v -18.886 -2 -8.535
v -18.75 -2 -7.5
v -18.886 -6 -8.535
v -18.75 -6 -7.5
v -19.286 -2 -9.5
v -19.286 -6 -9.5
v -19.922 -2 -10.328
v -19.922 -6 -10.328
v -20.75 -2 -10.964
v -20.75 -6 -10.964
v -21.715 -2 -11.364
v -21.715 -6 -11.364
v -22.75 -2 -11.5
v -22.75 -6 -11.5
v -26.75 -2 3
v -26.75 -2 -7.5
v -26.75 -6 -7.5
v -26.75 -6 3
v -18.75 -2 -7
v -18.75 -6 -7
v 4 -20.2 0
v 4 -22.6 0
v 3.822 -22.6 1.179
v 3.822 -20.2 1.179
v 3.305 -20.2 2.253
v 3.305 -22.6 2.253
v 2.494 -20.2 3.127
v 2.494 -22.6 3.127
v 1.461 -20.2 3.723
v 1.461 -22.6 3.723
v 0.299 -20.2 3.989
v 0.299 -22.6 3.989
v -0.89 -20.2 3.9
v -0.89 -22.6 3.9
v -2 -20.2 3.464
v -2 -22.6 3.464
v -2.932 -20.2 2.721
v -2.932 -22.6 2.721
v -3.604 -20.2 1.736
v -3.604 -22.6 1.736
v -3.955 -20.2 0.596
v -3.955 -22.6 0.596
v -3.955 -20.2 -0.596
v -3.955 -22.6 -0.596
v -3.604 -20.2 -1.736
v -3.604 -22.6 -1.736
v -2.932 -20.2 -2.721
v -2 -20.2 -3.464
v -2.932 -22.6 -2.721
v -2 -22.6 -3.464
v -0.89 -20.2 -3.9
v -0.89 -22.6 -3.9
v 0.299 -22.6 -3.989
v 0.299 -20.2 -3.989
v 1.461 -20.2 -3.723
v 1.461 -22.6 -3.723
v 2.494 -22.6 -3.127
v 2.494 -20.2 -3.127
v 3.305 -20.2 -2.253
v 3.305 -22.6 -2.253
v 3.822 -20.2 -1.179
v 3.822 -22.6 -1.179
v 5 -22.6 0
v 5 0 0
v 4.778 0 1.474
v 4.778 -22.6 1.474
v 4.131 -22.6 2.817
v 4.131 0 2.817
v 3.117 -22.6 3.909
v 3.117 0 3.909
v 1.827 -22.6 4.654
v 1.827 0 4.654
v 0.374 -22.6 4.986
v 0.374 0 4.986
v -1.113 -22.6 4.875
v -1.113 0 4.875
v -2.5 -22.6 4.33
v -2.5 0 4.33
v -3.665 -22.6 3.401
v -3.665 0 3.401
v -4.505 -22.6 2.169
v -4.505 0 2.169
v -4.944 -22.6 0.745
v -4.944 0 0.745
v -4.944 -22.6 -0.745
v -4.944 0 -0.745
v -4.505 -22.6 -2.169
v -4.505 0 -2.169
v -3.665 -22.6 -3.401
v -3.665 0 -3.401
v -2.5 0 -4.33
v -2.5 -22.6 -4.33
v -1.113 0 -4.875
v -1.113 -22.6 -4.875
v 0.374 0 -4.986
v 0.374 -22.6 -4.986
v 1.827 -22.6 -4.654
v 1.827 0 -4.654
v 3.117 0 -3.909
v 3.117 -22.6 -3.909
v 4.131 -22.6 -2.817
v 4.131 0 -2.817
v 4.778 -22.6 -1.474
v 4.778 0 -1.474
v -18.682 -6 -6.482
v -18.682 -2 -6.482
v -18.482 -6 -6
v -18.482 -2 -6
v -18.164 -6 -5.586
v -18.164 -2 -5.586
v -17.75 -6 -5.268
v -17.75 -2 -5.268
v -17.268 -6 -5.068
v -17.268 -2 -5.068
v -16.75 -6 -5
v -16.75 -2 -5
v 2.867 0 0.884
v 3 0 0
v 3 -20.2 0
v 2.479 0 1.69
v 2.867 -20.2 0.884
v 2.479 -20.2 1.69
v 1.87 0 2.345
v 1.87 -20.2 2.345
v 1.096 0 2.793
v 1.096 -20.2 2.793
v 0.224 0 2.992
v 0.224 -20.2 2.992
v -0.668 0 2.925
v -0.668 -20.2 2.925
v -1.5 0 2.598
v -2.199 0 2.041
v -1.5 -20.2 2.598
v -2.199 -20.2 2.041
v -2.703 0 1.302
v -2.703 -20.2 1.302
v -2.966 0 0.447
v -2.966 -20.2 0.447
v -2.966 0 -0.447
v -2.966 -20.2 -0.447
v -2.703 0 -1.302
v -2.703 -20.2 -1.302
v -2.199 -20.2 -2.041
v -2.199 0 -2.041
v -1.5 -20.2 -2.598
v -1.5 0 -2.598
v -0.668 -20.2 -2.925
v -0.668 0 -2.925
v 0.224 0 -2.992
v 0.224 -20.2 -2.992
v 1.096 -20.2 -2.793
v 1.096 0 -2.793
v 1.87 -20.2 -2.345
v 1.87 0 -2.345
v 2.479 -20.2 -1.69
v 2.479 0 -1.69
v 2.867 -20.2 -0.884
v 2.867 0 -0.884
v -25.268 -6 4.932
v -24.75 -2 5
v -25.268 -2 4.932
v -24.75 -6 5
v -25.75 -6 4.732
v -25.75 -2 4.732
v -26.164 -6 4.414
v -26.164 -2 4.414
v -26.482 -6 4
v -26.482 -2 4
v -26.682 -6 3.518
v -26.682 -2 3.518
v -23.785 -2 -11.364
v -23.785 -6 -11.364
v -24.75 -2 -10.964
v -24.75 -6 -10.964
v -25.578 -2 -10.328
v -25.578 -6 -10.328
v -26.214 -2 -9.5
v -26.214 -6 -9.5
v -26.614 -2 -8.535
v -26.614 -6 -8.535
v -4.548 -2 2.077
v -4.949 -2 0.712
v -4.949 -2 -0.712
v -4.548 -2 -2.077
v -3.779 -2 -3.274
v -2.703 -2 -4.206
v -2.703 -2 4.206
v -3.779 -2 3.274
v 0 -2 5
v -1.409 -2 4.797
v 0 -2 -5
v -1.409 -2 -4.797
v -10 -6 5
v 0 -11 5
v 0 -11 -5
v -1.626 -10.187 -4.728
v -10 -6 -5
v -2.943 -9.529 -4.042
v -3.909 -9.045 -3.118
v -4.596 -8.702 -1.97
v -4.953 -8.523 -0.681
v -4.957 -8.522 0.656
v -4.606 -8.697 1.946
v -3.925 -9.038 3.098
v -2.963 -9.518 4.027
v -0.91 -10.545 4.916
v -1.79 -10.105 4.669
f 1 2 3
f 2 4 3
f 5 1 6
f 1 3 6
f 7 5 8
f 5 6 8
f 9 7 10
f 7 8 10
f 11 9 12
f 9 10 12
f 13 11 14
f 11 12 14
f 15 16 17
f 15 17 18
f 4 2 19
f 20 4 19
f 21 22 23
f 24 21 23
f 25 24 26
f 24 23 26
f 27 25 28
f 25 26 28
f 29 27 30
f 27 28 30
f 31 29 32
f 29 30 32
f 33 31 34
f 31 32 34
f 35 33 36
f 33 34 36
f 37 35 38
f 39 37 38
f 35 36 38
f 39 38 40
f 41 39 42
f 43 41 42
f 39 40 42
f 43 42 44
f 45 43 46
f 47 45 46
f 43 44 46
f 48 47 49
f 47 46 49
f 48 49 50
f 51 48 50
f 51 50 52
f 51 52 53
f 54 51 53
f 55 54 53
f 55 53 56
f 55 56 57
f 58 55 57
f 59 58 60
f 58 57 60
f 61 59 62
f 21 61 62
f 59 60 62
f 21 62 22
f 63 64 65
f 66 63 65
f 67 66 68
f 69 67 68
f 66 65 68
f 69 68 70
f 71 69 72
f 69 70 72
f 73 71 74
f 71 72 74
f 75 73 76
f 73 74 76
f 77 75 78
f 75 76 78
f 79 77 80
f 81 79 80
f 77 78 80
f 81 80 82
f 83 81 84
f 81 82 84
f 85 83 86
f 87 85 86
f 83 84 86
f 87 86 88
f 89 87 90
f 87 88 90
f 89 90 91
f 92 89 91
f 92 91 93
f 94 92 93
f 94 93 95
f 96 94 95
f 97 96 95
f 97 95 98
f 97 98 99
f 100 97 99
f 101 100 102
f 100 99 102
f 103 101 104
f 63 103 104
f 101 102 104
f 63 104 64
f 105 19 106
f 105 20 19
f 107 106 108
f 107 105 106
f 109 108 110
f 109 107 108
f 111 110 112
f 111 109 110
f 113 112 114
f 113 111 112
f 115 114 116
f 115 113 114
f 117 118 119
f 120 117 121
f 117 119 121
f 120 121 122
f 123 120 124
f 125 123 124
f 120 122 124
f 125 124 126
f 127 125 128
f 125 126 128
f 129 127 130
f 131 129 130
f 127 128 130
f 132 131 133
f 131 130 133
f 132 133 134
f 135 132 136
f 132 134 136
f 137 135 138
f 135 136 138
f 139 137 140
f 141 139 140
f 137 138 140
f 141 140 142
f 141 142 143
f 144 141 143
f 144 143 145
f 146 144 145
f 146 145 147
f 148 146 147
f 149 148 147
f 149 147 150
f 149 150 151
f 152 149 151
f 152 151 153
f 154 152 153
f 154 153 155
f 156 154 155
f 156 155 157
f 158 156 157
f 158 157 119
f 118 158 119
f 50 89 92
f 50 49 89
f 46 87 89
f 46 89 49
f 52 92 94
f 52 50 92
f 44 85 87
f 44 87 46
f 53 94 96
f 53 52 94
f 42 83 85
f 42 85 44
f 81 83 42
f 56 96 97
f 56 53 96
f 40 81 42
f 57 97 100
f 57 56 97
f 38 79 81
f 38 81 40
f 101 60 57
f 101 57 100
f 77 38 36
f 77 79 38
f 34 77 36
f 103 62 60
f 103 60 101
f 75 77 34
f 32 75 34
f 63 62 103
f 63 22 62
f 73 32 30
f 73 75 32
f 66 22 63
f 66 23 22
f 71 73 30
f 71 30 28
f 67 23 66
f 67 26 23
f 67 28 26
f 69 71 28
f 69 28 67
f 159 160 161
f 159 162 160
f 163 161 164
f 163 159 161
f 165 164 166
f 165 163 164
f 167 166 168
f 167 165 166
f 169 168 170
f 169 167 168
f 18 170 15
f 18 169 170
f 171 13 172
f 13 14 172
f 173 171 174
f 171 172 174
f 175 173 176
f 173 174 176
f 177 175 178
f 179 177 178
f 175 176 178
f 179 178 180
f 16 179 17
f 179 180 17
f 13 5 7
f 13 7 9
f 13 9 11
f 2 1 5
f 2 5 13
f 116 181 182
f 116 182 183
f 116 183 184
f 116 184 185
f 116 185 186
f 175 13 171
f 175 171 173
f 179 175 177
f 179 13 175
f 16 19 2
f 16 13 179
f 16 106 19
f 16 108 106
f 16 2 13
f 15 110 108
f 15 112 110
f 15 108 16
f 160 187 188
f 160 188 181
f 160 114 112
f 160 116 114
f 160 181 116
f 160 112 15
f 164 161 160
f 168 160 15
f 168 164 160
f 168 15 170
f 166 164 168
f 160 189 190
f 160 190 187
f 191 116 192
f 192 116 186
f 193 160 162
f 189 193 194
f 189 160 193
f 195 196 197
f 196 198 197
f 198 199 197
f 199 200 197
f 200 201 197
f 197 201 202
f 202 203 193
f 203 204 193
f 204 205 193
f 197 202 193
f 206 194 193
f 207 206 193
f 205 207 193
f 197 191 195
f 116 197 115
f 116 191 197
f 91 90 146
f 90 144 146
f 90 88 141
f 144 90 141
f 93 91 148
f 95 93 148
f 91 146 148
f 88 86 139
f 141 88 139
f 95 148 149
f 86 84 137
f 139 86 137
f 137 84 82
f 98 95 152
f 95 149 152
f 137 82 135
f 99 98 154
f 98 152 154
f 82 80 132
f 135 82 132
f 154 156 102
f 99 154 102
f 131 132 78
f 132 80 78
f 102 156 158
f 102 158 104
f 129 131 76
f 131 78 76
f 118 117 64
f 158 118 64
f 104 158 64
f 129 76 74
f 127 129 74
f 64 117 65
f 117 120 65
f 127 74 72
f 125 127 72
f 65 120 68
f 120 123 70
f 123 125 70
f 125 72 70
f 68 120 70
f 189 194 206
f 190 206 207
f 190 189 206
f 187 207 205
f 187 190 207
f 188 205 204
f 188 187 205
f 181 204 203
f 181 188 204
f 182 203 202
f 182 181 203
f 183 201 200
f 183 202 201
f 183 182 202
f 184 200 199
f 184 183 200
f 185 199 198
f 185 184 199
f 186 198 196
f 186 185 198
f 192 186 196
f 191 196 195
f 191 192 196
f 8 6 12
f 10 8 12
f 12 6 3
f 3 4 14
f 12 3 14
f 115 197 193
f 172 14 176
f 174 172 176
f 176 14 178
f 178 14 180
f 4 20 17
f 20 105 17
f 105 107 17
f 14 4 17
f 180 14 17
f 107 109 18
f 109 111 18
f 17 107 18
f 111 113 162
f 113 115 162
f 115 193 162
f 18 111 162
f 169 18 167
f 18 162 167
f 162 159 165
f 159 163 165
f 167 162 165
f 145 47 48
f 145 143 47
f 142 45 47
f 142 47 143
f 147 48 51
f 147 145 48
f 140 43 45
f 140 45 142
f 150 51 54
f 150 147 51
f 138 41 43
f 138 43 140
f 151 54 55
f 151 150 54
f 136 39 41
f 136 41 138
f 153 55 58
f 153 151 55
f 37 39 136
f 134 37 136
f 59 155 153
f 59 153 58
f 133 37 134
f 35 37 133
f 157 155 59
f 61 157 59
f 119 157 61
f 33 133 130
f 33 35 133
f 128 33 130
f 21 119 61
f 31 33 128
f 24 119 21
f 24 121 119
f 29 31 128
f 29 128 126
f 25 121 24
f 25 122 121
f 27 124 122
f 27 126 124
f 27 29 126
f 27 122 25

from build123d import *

# Parameters (mm, degrees)
F0_R      = 5
F1_DEPTH  = 22.6
F2_R      = 3
F3_DEPTH  = 25
F4_R      = 4
F4_R_2    = 3
F5_DEPTH  = 2.4
F7_W      = 8
F7_H      = 10
F7_H_2    = 6.5
F8_DEPTH  = 9
F10_DEPTH = 25
F11_R     = 2
F12_R     = 2
F13_R     = 3.99999


# Not quite as in the source:
# - a fillet or chamfer is up to 0.001 mm smaller than in the source, because OpenCascade refuses the exact size


with BuildPart() as f1:
    # F0 (on Front) → F1 (new body)
    with BuildSketch(Plane.XZ):
        Circle(F0_R)
    extrude(amount=F1_DEPTH)

    # F2 (on face) → F3 (cut)
    with BuildSketch(Plane.XZ.offset(22.6)):
        Circle(F2_R)
    extrude(amount=-F3_DEPTH, mode=Mode.SUBTRACT)

    # F4 (on face) → F5 (cut)
    with BuildSketch(Plane.XZ.offset(22.6)):
        Circle(F4_R)
        Circle(F4_R_2, mode=Mode.SUBTRACT)
    extrude(amount=-F5_DEPTH, mode=Mode.SUBTRACT)


with BuildPart() as f8:
    # F7 (on offset) → F8 (new body)
    with BuildSketch(Plane(origin=(0, -2, 0), x_dir=(-1, 0, 0), z_dir=(0, 1, 0))):
        with BuildLine():
            ThreePointArc((0, 5), (5, 0), (0, -5))
            Line((0, -5), (18.75, -5))
            Line((18.75, -5), (18.75, 5))
            Line((18.75, 5), (0, 5))
        make_face()
        with Locations((22.75, 0)):
            Rectangle(F7_W, F7_H)
        with Locations((22.75, -8.25)):
            Rectangle(F7_W, F7_H_2)
    extrude(amount=-F8_DEPTH)

    # F9 (on face) → F10 (cut)
    with BuildSketch(Plane.XY.offset(5)):
        Polygon((-26.75, -11), (-5, -11), (-10, -6), (-26.75, -6), align=None)
        Polygon((-10, -6), (-5, -11), (0, -11), align=None)
    extrude(amount=-F10_DEPTH, mode=Mode.SUBTRACT)

    # F11
    f11_edges = [f8.edges().sort_by_distance(p)[0] for p in [
        (-26.75, -4, 5),
    ]]
    fillet(f11_edges, radius=F11_R)

    # F12
    f12_edges = [f8.edges().sort_by_distance(p)[0] for p in [
        (-18.75, -4, -5),
    ]]
    fillet(f12_edges, radius=F12_R)

    # F13 (radius 4 in the source; OpenCascade refuses exactly that, so slightly less here)
    f13_edges = [f8.edges().sort_by_distance(p)[0] for p in [
        (-18.75, -4, -11.5),
        (-26.75, -4, -11.5),
    ]]
    fillet(f13_edges, radius=F13_R)


solid = Compound([f1.part, f8.part])
